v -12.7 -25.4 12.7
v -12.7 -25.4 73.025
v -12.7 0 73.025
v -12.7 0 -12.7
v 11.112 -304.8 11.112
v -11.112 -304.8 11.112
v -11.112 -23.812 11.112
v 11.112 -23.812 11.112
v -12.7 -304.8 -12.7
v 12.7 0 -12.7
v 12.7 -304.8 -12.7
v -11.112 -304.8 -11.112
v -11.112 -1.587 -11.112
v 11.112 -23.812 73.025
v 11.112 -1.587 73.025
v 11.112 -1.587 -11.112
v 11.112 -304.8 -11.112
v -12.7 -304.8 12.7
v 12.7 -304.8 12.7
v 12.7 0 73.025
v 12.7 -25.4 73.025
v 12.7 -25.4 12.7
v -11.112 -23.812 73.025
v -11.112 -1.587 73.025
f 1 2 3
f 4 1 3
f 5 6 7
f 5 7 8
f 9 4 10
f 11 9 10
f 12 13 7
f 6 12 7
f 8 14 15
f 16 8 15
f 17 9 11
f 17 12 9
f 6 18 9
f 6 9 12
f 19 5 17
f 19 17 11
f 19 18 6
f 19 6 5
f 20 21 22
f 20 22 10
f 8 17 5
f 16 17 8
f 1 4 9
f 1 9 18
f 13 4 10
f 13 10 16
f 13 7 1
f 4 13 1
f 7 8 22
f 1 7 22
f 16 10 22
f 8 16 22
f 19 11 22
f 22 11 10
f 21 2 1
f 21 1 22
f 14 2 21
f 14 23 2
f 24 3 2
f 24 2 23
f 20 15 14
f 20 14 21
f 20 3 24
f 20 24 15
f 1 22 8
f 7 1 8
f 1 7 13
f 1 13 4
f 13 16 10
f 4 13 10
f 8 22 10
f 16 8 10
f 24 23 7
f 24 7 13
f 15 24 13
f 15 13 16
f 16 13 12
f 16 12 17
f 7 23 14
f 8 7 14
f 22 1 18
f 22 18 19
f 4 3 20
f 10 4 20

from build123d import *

# Parameters (mm, degrees)
F0_W          = 25.4
F0_H          = 25.4
F0_W_2        = 22.225
F0_H_2        = 22.225
F1_DEPTH      = 304.8
F3_DEPTH      = 12.701
F3_DEPTH_BACK = 12.701
F5_W          = 25.4
F5_H          = 25.4
F5_W_2        = 22.225
F5_H_2        = 22.225
F6_DEPTH      = 60.325
F6_DEPTH_BACK = 50.8
F8_DEPTH      = 25.401


with BuildPart() as f1:
    # F0 (on Front) → F1 (new body)
    with BuildSketch(Plane.XZ):
        Rectangle(F0_W, F0_H)
        Rectangle(F0_W_2, F0_H_2, mode=Mode.SUBTRACT)
    extrude(amount=F1_DEPTH)

    # F2 (on Right) → F3 (cut, two sides)
    with BuildSketch(Plane.YZ) as f3_sk:
        Polygon((0, -12.7), (0, 12.7), (-25.4, 12.7), align=None)
    extrude(amount=-F3_DEPTH, mode=Mode.SUBTRACT)
    extrude(f3_sk.sketch, amount=F3_DEPTH_BACK, mode=Mode.SUBTRACT)


with BuildPart() as f6:
    # F5 (on offset) → F6 (new body, two sides)
    with BuildSketch(Plane.XY.offset(12.7)) as f6_sk:
        with Locations((0, -12.7)):
            Rectangle(F5_W, F5_H)
        with Locations((0, -12.7)):
            Rectangle(F5_W_2, F5_H_2, mode=Mode.SUBTRACT)
    extrude(amount=F6_DEPTH)
    extrude(f6_sk.sketch, amount=-F6_DEPTH_BACK)

    # F7 (on face) → F8 (cut, through all)
    with BuildSketch(Plane.YZ.offset(12.7)):
        Polygon((-25.4, 12.7), (-25.4, -38.1), (0, -38.1), (0, -12.7), align=None)
    extrude(amount=-F8_DEPTH, mode=Mode.SUBTRACT)


solid = Compound([f1.part, f6.part])
